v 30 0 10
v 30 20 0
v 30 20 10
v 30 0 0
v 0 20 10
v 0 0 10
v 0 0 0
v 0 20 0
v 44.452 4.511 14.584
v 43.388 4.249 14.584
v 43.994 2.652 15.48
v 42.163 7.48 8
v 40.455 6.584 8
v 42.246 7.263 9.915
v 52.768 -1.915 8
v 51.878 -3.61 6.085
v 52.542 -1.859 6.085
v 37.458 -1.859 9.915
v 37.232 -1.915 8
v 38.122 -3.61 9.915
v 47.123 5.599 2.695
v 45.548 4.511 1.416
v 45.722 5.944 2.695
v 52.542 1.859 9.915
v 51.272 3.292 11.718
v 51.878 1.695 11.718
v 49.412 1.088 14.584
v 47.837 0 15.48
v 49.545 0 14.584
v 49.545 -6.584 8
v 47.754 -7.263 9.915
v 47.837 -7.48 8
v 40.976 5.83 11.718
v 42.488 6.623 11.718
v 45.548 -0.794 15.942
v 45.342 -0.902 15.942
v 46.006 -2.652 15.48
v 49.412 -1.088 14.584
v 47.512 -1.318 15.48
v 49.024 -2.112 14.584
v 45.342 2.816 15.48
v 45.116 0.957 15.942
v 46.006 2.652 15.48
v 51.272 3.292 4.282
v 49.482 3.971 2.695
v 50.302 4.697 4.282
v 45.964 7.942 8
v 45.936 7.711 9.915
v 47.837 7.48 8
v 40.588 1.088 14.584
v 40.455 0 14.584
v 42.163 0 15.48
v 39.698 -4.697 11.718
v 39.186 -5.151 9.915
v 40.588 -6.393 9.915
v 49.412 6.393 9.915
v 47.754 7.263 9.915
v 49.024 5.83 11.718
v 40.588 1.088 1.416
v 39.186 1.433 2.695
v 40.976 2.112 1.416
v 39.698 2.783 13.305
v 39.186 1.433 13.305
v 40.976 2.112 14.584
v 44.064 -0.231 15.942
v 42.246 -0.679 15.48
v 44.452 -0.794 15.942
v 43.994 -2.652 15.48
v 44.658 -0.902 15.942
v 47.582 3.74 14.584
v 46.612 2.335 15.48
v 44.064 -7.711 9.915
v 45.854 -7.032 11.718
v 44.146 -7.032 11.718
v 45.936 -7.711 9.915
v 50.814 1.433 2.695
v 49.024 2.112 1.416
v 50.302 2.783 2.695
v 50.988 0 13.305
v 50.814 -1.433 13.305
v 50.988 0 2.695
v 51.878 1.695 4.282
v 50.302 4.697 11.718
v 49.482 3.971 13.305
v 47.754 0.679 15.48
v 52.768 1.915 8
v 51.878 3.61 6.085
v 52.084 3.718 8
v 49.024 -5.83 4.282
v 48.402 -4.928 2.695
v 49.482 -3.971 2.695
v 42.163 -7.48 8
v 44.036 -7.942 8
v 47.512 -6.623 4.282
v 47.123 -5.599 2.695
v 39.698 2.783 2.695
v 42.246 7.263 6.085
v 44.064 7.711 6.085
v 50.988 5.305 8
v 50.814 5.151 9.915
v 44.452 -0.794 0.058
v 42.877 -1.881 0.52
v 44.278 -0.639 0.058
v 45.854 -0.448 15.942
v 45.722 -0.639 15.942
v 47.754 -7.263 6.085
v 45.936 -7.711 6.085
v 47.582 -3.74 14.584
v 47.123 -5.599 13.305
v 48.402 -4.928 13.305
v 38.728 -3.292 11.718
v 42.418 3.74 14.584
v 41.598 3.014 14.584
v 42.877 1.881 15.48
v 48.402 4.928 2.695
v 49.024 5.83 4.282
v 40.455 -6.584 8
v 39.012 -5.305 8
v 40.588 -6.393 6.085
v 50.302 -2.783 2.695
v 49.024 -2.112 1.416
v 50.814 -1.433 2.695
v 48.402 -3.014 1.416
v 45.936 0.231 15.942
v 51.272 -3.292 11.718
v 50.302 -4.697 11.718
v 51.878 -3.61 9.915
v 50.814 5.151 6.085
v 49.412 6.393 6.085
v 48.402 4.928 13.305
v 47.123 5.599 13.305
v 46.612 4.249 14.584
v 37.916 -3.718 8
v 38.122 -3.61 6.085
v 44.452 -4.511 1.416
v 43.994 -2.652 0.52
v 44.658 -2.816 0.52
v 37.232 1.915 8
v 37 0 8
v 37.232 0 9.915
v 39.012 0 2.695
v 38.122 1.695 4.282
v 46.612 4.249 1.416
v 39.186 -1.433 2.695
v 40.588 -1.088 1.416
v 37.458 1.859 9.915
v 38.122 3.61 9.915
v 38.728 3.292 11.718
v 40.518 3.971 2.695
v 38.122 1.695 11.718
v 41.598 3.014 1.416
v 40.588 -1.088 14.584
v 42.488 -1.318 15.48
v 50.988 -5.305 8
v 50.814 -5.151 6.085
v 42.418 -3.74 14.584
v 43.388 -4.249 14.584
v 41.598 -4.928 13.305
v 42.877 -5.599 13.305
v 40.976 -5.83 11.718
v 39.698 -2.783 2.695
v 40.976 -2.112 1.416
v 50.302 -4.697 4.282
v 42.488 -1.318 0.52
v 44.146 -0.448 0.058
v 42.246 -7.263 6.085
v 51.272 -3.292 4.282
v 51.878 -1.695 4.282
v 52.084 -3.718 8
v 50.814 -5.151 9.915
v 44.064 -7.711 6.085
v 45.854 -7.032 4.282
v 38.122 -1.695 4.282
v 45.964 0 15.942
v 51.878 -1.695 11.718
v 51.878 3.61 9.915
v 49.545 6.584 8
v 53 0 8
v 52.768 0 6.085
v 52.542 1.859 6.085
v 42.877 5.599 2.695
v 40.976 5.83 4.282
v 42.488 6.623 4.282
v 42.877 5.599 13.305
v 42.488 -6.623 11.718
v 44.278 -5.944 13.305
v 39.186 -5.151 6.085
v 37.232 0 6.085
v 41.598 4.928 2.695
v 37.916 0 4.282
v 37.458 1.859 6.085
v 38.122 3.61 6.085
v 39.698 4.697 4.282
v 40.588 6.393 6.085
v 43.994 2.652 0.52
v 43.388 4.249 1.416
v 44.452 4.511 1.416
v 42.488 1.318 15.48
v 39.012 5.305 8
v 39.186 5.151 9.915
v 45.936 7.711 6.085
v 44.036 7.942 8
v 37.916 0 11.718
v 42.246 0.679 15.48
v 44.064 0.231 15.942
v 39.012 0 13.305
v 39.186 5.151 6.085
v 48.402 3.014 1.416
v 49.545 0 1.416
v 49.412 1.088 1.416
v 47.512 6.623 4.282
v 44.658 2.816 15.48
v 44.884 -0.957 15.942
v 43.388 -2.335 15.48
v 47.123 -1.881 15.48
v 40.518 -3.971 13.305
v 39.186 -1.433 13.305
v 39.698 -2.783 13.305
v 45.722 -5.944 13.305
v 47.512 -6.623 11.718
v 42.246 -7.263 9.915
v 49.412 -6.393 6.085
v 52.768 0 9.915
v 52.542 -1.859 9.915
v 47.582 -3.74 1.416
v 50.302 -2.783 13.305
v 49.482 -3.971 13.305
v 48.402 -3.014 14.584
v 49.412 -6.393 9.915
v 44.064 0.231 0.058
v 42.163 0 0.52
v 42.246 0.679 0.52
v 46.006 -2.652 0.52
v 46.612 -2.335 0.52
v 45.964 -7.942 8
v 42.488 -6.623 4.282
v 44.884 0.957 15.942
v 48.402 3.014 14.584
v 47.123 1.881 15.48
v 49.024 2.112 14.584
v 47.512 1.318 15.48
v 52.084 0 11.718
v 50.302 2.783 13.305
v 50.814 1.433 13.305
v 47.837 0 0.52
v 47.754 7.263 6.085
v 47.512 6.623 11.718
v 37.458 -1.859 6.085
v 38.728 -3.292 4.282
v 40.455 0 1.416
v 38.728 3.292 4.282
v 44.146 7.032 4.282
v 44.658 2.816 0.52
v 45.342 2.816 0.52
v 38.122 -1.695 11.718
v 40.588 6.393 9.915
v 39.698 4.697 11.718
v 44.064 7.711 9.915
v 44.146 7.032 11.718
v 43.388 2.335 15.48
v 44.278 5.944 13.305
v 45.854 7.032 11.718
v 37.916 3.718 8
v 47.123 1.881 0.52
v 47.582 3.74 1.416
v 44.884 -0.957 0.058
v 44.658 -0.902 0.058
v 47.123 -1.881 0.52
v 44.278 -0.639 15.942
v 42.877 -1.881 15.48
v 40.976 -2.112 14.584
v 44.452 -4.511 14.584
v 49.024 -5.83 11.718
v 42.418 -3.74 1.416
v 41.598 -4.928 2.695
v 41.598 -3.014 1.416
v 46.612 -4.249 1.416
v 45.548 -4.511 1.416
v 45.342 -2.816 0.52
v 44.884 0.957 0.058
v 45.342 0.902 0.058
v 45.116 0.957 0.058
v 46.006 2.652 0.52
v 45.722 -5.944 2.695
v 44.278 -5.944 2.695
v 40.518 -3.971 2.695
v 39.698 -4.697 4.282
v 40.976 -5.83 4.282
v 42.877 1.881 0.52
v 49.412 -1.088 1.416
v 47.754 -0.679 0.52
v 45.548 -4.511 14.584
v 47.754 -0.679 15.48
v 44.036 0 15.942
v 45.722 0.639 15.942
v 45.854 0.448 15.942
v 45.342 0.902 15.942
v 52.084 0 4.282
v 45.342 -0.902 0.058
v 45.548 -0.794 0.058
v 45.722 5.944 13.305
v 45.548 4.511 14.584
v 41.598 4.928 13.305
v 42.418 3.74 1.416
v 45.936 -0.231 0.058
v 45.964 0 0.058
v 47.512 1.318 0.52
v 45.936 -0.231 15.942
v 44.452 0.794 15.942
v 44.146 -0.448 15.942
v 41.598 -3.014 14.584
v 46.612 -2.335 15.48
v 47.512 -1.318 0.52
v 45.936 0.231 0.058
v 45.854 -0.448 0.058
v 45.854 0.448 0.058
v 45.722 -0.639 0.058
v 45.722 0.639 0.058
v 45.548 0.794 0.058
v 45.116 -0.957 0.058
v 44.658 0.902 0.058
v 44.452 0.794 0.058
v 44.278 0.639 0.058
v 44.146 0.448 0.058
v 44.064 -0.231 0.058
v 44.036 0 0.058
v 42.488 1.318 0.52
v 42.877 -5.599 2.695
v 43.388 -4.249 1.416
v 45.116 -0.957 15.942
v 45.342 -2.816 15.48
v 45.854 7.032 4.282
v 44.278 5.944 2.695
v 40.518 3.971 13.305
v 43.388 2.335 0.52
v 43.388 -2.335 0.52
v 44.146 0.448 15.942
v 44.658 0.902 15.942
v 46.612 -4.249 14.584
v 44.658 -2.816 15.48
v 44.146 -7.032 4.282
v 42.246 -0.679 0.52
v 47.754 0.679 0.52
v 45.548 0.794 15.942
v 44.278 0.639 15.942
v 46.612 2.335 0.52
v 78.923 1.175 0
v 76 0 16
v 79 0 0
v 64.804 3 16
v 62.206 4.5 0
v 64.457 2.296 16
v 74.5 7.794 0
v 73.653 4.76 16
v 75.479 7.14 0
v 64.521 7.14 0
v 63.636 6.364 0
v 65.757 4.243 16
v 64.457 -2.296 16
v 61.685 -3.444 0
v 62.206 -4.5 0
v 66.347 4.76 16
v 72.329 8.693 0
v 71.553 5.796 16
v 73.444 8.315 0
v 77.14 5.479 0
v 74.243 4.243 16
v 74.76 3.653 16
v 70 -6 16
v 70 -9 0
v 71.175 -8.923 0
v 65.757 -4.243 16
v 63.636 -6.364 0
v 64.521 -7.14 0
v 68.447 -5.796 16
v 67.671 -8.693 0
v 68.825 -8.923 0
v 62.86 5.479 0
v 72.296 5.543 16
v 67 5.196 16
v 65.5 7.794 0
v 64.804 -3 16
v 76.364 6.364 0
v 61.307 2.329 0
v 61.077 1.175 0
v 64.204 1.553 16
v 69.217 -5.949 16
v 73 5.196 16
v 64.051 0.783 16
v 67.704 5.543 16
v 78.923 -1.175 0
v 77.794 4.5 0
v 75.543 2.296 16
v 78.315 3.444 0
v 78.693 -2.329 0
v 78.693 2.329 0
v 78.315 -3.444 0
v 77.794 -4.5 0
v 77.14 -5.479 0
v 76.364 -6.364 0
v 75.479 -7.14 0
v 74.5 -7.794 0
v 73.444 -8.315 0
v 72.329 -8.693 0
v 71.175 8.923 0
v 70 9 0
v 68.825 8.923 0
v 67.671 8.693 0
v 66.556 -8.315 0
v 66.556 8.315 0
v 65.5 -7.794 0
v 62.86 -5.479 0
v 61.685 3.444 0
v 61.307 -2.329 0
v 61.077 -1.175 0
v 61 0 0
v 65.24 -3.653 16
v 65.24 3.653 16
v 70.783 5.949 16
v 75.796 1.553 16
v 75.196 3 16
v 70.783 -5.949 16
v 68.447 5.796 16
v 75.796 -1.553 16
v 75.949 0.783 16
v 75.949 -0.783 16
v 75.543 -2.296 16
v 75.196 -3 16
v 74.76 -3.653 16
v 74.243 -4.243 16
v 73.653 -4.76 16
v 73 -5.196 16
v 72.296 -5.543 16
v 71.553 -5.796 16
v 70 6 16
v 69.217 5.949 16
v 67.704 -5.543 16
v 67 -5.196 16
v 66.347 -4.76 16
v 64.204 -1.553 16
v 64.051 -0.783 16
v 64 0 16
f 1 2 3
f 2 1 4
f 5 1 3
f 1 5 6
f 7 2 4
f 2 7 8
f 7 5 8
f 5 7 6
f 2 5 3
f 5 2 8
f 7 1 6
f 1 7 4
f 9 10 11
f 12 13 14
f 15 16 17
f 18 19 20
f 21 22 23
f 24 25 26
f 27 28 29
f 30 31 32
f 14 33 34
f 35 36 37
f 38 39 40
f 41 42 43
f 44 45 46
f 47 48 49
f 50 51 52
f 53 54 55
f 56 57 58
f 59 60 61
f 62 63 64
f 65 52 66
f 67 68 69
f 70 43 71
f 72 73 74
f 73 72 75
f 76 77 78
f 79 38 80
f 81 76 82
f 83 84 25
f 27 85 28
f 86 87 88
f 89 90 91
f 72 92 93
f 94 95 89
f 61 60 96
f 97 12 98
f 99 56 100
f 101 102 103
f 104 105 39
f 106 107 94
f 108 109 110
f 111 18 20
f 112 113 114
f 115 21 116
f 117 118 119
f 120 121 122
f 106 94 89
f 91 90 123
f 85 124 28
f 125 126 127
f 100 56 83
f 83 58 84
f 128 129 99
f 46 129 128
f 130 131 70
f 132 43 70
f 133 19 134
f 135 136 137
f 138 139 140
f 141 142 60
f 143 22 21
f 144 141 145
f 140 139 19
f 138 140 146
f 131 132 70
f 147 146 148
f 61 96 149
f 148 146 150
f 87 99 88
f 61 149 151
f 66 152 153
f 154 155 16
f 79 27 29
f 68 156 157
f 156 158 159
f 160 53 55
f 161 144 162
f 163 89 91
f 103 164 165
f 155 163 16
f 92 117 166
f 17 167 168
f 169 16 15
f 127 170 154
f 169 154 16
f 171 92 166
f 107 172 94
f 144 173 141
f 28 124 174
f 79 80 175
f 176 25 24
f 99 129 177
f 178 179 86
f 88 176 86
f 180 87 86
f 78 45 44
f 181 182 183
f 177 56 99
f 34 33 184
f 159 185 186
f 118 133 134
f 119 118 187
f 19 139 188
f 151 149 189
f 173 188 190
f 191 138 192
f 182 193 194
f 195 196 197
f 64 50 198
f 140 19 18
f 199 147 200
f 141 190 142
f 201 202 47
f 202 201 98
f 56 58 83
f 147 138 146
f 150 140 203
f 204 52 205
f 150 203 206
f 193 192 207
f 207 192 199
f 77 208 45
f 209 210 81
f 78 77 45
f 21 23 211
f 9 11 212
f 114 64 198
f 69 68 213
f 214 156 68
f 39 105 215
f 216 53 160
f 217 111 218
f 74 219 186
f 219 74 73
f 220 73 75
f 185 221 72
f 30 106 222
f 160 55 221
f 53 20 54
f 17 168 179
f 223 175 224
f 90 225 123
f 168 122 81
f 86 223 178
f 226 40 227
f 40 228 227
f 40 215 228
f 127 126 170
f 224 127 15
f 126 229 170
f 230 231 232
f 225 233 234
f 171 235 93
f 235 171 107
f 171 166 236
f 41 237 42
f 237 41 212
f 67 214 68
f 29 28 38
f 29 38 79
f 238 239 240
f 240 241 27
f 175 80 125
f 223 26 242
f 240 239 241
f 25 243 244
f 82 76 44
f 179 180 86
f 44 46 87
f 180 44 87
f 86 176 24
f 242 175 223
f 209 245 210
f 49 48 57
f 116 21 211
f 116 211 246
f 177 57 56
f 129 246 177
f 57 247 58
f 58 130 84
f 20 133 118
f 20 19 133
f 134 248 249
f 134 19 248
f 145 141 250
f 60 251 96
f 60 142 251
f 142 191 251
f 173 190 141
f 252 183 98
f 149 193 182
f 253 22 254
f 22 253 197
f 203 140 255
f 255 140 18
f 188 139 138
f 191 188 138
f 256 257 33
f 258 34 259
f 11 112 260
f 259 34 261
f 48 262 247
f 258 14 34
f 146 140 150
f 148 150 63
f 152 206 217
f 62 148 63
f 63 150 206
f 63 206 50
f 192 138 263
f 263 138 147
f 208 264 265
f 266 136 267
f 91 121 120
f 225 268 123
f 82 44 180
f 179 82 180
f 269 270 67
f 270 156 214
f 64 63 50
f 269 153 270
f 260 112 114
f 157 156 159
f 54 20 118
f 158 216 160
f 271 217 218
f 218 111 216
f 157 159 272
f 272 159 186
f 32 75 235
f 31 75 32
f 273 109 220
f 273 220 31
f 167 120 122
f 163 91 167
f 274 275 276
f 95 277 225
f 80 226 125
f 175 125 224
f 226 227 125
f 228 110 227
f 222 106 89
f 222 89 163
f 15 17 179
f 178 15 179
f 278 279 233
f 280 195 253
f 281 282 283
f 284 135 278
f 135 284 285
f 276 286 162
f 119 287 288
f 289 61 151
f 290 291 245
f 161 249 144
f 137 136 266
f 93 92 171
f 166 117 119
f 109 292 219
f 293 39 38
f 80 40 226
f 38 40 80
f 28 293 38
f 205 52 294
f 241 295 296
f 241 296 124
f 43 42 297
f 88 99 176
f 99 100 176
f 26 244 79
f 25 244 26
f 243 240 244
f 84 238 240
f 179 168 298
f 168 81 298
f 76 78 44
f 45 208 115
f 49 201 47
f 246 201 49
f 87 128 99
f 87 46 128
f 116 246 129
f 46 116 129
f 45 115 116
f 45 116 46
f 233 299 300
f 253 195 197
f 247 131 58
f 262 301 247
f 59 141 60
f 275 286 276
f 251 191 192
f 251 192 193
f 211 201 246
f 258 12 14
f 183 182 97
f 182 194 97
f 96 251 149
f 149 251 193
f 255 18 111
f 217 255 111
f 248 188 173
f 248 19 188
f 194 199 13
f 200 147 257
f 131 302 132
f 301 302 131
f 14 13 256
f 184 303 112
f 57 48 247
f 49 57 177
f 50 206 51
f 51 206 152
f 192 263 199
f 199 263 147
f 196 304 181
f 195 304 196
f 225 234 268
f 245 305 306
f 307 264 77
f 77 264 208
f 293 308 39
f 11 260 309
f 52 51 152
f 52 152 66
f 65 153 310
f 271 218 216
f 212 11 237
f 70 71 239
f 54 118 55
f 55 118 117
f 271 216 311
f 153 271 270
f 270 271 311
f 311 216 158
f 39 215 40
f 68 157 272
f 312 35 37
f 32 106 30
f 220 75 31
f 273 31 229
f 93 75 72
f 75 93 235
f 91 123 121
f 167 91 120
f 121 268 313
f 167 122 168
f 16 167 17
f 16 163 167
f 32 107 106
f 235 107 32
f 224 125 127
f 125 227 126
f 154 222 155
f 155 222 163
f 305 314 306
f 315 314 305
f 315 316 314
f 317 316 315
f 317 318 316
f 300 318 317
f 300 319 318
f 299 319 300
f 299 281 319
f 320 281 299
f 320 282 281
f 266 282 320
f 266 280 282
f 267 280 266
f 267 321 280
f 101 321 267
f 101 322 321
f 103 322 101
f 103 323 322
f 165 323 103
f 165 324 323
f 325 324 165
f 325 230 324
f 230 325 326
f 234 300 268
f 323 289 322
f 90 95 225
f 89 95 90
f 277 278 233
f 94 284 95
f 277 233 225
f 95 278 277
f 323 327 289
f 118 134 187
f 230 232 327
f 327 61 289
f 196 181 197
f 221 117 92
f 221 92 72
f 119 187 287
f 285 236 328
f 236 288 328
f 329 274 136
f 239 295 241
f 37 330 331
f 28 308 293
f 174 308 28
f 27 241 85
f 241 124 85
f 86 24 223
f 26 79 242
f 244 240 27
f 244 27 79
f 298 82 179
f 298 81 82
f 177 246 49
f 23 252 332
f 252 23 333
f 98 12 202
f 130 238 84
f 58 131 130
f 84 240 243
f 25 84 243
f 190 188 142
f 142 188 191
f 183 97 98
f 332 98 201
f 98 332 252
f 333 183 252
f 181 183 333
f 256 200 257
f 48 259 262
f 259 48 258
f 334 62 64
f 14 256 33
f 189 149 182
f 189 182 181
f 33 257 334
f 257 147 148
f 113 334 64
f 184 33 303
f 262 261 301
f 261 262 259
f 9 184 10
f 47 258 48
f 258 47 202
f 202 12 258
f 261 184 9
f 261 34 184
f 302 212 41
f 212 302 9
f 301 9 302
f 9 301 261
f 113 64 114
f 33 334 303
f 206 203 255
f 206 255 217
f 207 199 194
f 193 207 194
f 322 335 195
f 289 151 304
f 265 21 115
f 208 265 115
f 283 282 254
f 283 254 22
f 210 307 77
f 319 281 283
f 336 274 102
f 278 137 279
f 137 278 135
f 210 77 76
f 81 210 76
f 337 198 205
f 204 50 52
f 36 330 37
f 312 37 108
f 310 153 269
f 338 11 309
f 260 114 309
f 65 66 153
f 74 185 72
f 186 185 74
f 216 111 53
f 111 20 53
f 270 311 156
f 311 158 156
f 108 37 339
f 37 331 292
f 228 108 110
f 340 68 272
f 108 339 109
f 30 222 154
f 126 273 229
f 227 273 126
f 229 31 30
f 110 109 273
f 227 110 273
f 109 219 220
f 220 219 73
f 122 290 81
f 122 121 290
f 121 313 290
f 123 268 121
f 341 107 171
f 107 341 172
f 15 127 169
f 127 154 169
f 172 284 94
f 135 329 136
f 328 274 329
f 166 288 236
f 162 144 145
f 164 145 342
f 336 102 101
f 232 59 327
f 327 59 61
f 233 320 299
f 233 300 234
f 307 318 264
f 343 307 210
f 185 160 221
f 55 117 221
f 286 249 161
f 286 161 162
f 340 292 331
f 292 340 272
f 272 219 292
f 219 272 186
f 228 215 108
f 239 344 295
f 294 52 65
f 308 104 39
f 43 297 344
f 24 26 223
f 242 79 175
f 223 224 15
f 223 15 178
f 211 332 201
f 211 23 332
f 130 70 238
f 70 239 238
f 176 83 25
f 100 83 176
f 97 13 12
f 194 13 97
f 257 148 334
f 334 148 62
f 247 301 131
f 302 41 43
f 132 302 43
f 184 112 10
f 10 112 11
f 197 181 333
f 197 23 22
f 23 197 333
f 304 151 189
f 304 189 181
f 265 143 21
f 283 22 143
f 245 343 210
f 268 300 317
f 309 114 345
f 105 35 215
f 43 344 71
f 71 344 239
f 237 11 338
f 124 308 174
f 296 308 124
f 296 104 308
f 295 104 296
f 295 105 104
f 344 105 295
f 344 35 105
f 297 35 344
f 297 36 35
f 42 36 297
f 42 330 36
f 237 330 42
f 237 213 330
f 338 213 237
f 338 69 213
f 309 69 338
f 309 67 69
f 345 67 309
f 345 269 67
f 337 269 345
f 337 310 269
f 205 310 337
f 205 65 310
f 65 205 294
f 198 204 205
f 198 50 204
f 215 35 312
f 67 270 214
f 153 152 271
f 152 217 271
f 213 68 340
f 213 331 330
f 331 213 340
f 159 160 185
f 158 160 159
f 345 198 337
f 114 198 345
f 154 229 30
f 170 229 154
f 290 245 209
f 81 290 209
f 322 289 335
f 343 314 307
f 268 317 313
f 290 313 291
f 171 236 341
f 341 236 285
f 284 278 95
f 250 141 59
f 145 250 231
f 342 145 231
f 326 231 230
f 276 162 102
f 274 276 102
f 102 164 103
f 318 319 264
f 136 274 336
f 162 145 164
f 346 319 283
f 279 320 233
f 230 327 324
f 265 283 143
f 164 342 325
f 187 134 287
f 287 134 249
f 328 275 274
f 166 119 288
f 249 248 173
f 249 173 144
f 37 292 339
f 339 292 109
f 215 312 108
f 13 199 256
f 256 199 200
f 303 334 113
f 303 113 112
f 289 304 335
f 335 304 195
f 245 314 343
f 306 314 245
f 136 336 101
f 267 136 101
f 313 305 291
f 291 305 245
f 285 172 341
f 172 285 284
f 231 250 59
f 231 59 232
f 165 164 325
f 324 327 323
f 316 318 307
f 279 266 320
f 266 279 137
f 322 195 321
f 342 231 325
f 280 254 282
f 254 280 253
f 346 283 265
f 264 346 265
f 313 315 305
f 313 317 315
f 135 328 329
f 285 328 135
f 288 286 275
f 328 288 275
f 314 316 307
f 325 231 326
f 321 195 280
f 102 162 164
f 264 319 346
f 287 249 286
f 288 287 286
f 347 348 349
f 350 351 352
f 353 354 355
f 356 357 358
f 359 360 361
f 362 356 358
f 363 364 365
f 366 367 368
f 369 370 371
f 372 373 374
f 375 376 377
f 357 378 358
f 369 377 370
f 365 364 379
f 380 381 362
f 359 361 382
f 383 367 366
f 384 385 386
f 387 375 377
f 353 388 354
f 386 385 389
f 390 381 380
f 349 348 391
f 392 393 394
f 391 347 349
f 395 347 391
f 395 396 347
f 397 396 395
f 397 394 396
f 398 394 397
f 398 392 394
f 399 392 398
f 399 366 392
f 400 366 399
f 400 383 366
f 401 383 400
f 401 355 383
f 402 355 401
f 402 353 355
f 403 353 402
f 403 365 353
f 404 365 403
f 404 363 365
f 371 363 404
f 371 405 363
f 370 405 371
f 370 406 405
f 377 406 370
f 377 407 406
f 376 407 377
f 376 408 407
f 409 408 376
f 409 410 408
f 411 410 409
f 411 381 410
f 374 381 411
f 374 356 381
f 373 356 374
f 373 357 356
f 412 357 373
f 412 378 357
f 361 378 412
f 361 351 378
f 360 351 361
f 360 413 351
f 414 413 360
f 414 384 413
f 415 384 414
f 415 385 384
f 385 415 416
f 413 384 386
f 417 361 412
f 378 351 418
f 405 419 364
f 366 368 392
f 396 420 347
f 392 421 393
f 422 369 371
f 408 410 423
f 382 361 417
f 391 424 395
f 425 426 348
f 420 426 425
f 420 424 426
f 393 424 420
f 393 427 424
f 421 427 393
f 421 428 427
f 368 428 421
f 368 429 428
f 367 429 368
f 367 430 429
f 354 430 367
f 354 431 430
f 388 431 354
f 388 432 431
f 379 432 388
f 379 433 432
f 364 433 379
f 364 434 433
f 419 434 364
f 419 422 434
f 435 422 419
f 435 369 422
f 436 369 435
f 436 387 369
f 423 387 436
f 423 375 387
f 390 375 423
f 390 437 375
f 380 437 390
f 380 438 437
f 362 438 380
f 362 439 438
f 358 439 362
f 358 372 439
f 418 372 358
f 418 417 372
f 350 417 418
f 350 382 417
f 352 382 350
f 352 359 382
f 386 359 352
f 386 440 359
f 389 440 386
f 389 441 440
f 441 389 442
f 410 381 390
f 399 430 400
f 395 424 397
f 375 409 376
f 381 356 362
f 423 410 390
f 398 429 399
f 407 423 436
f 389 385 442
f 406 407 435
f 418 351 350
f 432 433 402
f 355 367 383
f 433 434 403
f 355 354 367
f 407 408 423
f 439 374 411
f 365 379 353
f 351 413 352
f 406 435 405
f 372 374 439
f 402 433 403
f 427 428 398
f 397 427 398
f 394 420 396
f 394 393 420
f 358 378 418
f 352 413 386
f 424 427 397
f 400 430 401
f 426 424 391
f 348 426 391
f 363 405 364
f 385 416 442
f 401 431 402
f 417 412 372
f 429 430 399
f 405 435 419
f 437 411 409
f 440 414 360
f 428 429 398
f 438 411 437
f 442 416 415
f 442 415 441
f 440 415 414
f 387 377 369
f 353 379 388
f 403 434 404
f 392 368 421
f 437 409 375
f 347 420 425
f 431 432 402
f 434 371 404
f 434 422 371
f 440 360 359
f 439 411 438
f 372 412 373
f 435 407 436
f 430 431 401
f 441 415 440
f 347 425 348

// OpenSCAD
// primitives.scad — the three solid building blocks.
// Every measurement below is in the file's own units;
// OpenSCAD itself has no units (chapter 1 explains).

// A box: width (x), depth (y), height (z), in that order.
cube([30, 20, 10]);

// A ball. r is the radius; it sits centred on the origin,
// so half of it is below z=0 until something moves it.
translate([45, 0, 8])
    sphere(r = 8);

// A can. h is height, r1 the bottom radius, r2 the top
// radius — r1 != r2 makes a cone or a tapered pot wall.
// $fn is how many flat sides approximate the curve:
// the preview default is coarse; here 48 is requested.
translate([70, 0, 0])
    cylinder(h = 16, r1 = 9, r2 = 6, $fn = 48);
